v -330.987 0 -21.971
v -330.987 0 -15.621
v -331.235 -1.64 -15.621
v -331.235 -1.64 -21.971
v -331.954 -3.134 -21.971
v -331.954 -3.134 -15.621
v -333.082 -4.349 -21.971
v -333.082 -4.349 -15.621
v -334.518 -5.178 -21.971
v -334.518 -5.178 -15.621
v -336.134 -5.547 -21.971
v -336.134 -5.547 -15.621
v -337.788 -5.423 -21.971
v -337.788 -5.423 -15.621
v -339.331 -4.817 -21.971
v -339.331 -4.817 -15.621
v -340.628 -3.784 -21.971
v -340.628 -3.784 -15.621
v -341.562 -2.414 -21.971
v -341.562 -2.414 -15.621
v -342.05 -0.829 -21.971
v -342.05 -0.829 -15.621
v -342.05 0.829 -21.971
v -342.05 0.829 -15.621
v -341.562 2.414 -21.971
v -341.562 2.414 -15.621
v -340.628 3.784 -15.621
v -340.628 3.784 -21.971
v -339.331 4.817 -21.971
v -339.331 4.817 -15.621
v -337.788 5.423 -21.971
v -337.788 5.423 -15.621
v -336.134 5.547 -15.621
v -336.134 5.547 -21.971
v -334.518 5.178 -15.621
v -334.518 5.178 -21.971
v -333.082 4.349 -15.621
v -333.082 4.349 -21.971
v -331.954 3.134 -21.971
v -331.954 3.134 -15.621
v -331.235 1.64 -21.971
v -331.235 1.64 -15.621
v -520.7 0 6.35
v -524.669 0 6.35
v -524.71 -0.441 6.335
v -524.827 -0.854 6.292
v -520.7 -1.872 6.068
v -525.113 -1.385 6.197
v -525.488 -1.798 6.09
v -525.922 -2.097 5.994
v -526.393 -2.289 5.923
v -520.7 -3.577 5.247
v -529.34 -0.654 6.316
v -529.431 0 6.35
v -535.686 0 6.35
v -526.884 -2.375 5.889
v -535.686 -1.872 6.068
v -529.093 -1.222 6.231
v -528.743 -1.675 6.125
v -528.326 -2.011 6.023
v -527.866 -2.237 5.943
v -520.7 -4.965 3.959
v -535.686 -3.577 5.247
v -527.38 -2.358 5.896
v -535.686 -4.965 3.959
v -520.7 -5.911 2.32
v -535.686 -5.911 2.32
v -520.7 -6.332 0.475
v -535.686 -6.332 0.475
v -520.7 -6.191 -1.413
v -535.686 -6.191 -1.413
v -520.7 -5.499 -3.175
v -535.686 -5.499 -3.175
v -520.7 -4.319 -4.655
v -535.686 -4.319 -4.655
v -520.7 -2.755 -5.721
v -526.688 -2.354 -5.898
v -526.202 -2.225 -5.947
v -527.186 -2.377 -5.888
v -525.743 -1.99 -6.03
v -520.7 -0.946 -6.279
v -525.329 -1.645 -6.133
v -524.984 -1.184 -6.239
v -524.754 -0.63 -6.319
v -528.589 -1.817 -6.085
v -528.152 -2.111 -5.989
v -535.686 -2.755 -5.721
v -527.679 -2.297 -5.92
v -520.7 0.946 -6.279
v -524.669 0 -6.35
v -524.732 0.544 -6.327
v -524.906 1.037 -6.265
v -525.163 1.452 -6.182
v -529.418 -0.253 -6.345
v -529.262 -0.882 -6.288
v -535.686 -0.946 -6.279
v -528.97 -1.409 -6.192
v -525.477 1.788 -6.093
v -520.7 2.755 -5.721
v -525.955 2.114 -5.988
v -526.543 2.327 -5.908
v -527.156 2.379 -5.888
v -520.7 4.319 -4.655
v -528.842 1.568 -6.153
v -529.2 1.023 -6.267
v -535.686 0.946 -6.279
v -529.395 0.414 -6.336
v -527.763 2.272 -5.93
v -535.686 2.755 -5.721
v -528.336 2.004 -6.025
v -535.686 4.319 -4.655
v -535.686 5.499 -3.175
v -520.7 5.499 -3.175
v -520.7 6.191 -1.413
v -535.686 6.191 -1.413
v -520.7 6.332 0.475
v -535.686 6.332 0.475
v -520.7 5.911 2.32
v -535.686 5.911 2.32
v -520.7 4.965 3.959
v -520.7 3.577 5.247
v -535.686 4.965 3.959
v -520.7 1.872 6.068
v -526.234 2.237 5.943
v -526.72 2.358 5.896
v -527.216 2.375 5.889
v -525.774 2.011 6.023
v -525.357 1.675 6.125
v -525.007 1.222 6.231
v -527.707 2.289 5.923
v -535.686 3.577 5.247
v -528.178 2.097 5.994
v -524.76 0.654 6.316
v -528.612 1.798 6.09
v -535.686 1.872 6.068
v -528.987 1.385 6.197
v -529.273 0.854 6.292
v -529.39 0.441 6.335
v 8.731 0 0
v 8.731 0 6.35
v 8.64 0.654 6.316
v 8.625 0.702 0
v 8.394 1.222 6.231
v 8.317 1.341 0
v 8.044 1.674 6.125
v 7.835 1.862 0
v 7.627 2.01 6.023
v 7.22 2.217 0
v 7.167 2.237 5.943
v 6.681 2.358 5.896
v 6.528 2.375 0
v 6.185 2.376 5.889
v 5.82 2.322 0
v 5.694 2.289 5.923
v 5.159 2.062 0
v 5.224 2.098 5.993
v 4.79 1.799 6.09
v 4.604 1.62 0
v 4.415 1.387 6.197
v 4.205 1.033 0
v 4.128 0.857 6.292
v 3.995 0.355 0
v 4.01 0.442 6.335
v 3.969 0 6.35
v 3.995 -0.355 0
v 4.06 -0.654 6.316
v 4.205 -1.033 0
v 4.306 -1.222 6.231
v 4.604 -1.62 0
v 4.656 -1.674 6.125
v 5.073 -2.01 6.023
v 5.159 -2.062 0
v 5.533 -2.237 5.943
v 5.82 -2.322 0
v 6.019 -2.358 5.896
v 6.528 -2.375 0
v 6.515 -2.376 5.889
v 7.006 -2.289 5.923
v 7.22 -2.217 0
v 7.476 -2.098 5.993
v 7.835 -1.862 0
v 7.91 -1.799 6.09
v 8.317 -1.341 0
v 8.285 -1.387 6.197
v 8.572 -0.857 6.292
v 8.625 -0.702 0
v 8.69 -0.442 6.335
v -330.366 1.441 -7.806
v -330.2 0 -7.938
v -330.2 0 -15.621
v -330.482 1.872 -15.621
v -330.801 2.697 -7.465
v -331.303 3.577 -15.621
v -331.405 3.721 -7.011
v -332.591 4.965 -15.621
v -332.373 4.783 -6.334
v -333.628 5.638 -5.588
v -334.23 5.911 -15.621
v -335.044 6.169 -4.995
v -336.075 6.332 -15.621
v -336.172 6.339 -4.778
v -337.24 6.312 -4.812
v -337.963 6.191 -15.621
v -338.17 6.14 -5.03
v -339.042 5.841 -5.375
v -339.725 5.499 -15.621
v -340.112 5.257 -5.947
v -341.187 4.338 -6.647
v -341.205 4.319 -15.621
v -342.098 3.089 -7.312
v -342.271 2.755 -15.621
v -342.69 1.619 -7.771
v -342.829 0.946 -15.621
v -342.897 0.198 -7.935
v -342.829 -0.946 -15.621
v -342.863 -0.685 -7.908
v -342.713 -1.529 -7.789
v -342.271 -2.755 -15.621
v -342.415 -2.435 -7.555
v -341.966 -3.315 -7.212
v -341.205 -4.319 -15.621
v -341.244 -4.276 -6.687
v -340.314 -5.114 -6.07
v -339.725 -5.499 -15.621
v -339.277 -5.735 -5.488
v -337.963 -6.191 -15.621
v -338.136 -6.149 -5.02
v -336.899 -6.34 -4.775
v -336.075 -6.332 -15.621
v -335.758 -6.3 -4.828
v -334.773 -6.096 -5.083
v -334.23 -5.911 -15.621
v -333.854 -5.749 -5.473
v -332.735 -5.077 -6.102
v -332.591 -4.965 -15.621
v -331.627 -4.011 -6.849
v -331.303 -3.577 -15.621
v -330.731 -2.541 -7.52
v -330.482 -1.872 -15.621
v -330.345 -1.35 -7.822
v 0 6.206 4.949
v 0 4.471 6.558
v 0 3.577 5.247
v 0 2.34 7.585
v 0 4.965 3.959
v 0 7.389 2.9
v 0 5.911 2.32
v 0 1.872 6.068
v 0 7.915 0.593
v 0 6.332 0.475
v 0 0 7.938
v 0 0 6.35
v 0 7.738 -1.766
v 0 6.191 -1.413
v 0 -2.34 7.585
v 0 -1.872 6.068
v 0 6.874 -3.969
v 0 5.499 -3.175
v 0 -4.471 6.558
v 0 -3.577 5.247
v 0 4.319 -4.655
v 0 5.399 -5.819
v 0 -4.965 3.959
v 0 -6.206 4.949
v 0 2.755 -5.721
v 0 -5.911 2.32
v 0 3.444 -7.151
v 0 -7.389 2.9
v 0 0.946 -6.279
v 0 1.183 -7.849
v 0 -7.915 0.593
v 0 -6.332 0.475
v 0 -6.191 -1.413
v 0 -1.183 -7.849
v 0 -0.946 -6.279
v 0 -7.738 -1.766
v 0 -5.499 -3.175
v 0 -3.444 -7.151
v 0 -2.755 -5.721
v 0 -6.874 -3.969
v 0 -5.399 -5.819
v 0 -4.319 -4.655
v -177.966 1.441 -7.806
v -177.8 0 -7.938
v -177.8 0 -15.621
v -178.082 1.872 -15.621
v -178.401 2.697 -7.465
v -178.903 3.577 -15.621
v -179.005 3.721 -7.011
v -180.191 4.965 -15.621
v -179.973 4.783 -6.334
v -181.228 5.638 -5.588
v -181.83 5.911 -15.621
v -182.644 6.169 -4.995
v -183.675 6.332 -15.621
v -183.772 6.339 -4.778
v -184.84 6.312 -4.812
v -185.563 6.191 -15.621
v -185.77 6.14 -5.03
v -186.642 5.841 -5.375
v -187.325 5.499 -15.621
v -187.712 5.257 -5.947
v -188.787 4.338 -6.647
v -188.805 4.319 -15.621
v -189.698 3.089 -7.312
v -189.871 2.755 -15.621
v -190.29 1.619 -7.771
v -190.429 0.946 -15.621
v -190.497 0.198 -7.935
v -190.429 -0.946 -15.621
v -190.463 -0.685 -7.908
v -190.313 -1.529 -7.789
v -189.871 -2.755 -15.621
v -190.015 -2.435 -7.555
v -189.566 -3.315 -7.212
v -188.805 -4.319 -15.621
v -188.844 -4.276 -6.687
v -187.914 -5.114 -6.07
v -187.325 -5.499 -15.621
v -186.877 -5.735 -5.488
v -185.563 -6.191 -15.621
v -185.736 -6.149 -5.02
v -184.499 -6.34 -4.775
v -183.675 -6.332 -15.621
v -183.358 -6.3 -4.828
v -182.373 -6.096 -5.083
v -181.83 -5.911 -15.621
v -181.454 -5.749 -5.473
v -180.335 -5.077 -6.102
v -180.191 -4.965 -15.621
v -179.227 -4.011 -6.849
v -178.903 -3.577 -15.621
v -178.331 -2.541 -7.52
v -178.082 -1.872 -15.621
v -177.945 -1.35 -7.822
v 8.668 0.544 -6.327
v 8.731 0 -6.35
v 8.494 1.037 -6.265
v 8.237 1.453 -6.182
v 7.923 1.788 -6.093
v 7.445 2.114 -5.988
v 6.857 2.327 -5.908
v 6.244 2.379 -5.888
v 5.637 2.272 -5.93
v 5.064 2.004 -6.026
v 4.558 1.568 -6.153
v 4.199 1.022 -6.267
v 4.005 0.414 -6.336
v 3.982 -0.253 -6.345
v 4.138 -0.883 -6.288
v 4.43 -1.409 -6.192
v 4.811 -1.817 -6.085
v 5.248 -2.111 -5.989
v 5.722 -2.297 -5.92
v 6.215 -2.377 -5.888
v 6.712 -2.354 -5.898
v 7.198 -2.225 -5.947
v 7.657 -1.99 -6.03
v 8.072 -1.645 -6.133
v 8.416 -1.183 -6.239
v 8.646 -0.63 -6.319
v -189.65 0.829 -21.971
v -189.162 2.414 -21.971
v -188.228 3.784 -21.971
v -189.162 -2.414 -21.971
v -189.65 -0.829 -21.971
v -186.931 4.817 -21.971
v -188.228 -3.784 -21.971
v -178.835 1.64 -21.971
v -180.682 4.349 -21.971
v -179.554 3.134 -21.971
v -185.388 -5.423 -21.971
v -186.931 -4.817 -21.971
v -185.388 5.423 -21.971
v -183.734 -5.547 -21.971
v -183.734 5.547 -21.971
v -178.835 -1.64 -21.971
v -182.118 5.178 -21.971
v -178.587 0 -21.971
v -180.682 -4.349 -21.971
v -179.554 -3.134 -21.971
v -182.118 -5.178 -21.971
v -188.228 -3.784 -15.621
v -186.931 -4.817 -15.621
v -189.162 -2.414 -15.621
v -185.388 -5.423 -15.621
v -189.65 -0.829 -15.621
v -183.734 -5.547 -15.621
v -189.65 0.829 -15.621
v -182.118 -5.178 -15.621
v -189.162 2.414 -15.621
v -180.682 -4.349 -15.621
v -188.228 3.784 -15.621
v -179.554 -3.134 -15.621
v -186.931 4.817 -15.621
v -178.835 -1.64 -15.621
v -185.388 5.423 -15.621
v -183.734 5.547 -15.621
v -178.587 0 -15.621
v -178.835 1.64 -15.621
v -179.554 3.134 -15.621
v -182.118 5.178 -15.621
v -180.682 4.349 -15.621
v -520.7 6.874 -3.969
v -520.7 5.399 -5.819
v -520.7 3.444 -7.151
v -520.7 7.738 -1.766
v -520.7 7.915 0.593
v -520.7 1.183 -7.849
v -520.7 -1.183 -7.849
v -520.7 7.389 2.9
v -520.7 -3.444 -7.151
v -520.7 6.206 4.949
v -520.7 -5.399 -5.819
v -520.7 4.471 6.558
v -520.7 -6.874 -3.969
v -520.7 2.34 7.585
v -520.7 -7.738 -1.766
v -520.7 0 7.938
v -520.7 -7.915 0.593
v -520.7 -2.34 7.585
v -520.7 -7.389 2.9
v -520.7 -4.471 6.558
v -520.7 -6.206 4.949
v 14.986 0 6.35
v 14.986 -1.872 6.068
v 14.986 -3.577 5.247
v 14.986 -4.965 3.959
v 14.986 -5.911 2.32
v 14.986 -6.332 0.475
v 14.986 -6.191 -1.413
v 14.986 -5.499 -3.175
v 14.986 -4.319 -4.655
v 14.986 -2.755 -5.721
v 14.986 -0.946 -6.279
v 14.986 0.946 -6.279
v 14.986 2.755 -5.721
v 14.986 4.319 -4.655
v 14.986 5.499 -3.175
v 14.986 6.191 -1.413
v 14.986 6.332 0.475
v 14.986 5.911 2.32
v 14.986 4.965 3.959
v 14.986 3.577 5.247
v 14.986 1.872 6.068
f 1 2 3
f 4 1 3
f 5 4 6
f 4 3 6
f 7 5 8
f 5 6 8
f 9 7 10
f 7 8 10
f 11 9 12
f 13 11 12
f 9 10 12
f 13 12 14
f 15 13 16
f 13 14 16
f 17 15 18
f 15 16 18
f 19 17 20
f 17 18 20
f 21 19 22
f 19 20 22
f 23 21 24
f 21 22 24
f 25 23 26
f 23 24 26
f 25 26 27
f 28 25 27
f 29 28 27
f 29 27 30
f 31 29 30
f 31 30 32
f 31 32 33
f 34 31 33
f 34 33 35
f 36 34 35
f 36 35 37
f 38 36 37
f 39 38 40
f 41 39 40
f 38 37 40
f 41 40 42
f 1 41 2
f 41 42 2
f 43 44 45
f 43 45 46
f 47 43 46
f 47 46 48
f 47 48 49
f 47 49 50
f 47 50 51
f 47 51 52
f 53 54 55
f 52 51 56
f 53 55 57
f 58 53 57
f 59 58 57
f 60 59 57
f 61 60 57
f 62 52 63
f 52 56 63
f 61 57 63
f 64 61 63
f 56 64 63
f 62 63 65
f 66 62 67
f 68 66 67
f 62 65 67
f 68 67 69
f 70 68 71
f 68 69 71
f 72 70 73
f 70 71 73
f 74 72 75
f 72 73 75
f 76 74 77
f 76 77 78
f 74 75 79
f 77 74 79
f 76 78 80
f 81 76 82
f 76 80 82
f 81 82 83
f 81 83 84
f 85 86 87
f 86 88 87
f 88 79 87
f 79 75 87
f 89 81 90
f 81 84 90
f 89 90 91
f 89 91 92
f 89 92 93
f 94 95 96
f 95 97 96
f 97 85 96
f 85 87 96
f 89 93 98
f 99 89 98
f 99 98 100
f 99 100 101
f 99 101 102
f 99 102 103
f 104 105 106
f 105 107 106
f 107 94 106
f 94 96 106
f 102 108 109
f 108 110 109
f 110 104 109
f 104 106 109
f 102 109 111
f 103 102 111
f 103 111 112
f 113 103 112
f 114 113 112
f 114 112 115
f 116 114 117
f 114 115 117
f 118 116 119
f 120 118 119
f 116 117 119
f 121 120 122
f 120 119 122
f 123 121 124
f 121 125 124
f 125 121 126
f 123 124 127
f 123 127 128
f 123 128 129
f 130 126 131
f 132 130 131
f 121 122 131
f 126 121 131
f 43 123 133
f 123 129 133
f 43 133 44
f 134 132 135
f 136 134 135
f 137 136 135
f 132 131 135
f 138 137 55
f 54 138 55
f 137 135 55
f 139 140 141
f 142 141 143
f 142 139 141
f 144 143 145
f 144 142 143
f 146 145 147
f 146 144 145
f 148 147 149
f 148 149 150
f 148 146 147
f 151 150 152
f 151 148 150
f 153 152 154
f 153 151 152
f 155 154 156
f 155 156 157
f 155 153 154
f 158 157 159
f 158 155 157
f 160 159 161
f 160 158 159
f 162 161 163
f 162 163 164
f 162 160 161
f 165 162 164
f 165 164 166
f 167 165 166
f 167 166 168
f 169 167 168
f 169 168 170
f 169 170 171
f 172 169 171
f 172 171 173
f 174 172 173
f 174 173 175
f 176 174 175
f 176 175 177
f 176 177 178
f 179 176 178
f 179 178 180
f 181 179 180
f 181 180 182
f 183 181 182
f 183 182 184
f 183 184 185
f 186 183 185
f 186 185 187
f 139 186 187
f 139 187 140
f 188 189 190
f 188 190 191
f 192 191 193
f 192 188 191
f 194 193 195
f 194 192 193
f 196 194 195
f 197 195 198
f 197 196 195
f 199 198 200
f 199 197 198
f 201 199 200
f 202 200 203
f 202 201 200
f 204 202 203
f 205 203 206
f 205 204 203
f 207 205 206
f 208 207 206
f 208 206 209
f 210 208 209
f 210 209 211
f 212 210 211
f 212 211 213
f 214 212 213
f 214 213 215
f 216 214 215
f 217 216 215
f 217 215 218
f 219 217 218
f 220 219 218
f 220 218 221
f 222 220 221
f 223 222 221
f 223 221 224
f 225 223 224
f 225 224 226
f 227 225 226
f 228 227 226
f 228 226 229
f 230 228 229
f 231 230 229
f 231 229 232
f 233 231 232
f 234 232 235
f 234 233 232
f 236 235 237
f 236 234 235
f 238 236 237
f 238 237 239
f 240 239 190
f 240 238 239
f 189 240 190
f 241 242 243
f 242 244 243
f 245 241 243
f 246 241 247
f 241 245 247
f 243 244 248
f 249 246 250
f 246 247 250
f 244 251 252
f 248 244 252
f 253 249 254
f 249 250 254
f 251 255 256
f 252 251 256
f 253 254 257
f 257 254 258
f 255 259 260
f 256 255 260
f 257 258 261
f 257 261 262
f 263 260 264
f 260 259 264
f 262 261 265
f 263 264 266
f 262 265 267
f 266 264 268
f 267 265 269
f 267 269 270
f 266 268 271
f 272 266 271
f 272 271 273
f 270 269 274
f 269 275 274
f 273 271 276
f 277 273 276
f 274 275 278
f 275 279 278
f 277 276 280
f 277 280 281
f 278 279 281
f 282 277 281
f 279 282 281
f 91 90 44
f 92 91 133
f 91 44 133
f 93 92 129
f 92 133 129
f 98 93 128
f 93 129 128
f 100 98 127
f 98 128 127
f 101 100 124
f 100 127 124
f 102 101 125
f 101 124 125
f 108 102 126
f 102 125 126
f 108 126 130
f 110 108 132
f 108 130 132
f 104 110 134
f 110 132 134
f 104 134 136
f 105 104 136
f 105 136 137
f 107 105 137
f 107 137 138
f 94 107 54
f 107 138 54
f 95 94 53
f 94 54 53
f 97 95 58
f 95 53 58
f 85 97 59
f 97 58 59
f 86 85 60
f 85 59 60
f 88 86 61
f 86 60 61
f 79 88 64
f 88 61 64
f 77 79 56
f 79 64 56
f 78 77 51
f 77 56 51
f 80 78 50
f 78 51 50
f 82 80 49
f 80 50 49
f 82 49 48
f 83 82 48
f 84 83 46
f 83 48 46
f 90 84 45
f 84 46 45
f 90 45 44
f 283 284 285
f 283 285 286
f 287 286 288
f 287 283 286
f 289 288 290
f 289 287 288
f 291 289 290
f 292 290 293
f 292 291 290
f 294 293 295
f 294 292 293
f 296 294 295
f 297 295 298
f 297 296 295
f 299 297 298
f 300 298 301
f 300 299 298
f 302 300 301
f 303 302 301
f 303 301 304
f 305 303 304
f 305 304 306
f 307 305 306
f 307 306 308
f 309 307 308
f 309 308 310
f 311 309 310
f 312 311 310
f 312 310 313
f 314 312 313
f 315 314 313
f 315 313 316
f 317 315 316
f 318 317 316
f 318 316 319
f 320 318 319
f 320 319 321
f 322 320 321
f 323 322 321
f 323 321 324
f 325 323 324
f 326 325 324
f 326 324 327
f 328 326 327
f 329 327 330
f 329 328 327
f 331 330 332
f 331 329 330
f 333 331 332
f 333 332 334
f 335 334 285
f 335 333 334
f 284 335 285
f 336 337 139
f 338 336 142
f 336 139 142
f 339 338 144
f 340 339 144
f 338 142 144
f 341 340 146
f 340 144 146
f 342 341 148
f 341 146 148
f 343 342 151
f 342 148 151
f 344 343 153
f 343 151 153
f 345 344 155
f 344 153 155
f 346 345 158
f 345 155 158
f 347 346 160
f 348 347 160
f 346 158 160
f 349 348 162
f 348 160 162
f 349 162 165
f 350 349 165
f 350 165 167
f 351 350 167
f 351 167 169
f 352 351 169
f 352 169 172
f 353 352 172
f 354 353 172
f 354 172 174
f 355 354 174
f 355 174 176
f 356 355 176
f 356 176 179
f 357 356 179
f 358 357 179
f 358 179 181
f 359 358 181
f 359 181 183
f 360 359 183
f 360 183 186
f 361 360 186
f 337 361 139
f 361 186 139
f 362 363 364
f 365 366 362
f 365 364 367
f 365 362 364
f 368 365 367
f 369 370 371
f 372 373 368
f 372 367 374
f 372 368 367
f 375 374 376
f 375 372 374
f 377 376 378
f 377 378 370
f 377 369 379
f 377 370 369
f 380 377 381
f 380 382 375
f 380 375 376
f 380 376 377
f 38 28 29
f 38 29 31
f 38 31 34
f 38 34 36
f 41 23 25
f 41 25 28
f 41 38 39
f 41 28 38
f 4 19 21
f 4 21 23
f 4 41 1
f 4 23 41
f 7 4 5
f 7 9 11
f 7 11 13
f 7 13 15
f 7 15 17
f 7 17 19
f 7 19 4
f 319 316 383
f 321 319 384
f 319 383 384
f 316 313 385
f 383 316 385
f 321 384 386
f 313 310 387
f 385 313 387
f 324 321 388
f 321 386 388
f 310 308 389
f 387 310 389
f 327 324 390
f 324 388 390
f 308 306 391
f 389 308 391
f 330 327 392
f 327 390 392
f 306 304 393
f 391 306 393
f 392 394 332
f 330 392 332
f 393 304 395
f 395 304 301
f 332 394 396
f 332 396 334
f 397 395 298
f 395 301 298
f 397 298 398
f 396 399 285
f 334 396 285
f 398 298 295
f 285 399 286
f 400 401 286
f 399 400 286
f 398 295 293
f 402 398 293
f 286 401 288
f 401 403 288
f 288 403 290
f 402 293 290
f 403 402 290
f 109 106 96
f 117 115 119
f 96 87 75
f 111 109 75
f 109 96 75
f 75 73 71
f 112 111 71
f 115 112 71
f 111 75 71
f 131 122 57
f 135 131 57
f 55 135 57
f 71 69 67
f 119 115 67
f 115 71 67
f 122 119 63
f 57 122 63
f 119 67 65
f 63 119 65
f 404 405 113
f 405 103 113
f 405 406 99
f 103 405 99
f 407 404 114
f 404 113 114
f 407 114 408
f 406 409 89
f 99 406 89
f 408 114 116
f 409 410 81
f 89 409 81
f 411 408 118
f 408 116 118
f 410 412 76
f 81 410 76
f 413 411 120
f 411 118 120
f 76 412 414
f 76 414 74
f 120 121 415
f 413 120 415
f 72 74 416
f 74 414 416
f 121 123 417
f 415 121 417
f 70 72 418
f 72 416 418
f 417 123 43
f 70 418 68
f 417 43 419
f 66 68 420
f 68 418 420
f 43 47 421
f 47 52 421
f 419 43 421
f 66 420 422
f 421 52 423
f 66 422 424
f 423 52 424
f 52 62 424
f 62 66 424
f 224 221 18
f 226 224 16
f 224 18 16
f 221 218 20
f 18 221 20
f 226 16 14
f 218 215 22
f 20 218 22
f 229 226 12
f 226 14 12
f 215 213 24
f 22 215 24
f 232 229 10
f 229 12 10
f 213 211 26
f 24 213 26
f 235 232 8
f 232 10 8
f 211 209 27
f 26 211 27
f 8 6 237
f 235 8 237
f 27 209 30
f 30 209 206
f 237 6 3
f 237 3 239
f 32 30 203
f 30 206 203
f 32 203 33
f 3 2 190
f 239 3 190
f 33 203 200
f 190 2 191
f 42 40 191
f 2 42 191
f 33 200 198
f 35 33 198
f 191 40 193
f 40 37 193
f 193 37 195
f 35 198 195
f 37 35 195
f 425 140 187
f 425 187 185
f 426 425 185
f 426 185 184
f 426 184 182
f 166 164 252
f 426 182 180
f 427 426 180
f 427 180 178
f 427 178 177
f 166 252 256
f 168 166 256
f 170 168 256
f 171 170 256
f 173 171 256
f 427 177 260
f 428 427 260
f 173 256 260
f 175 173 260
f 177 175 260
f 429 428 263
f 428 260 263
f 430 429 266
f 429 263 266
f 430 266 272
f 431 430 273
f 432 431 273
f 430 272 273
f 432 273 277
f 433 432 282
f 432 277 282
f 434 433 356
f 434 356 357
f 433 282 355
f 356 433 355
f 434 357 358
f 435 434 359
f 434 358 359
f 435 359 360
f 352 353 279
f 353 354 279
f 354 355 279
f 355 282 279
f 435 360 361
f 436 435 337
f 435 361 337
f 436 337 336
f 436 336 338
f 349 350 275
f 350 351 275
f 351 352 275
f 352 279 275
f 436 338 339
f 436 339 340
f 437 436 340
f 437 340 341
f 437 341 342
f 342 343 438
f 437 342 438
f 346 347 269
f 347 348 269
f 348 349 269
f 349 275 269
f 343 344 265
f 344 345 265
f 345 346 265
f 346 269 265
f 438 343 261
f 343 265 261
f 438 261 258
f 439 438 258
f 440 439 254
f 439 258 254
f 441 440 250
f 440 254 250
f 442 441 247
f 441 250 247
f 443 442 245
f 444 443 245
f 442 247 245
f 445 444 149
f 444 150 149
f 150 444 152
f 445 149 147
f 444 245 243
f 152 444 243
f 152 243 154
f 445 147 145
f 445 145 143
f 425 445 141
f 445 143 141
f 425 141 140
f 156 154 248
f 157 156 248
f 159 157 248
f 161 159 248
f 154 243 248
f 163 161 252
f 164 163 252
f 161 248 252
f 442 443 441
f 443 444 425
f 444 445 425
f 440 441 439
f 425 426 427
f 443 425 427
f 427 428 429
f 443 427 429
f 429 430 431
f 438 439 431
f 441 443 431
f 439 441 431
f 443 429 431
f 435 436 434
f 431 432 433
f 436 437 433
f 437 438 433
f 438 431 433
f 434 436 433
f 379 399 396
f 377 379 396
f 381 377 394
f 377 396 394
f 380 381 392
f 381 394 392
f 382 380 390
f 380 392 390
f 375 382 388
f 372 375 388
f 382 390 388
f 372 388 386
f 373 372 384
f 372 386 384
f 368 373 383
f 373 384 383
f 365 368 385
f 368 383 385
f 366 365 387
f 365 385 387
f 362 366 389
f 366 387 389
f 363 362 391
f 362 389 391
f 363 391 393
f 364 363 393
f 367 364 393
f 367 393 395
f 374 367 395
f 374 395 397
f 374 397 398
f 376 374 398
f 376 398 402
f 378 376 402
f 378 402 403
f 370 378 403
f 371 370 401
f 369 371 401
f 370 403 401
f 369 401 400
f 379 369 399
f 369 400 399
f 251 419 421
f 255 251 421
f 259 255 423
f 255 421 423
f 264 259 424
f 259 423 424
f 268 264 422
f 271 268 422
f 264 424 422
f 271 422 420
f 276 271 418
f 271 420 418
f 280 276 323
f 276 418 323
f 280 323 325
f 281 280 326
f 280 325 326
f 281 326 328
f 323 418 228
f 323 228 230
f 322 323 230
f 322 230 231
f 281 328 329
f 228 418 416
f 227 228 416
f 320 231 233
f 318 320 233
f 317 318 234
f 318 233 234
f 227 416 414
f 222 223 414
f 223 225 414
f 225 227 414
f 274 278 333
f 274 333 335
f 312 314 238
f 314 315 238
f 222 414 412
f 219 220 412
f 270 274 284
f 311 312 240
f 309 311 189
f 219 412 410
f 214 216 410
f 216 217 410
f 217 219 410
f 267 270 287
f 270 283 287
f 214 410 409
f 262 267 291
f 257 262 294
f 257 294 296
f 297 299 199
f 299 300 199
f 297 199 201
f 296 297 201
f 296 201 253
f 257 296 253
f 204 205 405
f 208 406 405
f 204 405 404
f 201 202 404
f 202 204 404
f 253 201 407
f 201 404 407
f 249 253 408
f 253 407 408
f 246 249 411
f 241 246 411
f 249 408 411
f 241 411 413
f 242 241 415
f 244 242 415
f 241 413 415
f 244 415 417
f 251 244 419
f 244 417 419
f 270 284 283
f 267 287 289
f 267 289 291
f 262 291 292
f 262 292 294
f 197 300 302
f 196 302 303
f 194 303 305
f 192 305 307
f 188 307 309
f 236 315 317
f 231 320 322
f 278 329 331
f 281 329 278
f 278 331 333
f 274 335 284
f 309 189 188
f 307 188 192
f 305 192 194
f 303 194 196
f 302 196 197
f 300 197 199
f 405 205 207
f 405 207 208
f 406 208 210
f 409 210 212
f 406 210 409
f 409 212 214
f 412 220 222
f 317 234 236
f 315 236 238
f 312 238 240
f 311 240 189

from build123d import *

# Parameters (mm, degrees)
F2_R     = 2.38125
F3_DEPTH = 25.4
F4_R     = 6.35
F5_DEPTH = 15.621
F6_R     = 5.5626
F7_DEPTH = 6.35


with BuildPart() as f1:
    # F0 (on Front) → F1 (revolve)
    with BuildSketch(Plane.XZ):
        Polygon((-535.686, 0), (14.986, 0), (14.986, 6.35), (0, 6.35), (0, 7.9375), (-520.7, 7.9375), (-520.7, 6.35), (-535.686, 6.35), align=None)
    revolve(axis=Axis((-260.35, 0, 0), (1, 0, 0)))

    # F2 (on Top) → F3 (cut, symmetric)
    with BuildSketch(Plane.XY):
        with Locations((6.35, 0)):
            Circle(F2_R)
        with Locations((-527.05, 0)):
            Circle(F2_R)
    extrude(amount=F3_DEPTH, both=True, mode=Mode.SUBTRACT)

    # F4 (on Top) → F5 (join)
    with BuildSketch(Plane.XY):
        with Locations((-336.55, 0)):
            Circle(F4_R)
        with Locations((-184.15, 0)):
            Circle(F4_R)
    extrude(amount=-F5_DEPTH)

    # F6 (on face) → F7 (join)
    with BuildSketch(Plane(origin=(0, 0, -15.621), x_dir=(1, 0, 0), z_dir=(0, 0, -1))):
        with Locations((-336.55, 0)):
            Circle(F6_R)
        with Locations((-184.15, 0)):
            Circle(F6_R)
    extrude(amount=F7_DEPTH)


solid = f1.part
